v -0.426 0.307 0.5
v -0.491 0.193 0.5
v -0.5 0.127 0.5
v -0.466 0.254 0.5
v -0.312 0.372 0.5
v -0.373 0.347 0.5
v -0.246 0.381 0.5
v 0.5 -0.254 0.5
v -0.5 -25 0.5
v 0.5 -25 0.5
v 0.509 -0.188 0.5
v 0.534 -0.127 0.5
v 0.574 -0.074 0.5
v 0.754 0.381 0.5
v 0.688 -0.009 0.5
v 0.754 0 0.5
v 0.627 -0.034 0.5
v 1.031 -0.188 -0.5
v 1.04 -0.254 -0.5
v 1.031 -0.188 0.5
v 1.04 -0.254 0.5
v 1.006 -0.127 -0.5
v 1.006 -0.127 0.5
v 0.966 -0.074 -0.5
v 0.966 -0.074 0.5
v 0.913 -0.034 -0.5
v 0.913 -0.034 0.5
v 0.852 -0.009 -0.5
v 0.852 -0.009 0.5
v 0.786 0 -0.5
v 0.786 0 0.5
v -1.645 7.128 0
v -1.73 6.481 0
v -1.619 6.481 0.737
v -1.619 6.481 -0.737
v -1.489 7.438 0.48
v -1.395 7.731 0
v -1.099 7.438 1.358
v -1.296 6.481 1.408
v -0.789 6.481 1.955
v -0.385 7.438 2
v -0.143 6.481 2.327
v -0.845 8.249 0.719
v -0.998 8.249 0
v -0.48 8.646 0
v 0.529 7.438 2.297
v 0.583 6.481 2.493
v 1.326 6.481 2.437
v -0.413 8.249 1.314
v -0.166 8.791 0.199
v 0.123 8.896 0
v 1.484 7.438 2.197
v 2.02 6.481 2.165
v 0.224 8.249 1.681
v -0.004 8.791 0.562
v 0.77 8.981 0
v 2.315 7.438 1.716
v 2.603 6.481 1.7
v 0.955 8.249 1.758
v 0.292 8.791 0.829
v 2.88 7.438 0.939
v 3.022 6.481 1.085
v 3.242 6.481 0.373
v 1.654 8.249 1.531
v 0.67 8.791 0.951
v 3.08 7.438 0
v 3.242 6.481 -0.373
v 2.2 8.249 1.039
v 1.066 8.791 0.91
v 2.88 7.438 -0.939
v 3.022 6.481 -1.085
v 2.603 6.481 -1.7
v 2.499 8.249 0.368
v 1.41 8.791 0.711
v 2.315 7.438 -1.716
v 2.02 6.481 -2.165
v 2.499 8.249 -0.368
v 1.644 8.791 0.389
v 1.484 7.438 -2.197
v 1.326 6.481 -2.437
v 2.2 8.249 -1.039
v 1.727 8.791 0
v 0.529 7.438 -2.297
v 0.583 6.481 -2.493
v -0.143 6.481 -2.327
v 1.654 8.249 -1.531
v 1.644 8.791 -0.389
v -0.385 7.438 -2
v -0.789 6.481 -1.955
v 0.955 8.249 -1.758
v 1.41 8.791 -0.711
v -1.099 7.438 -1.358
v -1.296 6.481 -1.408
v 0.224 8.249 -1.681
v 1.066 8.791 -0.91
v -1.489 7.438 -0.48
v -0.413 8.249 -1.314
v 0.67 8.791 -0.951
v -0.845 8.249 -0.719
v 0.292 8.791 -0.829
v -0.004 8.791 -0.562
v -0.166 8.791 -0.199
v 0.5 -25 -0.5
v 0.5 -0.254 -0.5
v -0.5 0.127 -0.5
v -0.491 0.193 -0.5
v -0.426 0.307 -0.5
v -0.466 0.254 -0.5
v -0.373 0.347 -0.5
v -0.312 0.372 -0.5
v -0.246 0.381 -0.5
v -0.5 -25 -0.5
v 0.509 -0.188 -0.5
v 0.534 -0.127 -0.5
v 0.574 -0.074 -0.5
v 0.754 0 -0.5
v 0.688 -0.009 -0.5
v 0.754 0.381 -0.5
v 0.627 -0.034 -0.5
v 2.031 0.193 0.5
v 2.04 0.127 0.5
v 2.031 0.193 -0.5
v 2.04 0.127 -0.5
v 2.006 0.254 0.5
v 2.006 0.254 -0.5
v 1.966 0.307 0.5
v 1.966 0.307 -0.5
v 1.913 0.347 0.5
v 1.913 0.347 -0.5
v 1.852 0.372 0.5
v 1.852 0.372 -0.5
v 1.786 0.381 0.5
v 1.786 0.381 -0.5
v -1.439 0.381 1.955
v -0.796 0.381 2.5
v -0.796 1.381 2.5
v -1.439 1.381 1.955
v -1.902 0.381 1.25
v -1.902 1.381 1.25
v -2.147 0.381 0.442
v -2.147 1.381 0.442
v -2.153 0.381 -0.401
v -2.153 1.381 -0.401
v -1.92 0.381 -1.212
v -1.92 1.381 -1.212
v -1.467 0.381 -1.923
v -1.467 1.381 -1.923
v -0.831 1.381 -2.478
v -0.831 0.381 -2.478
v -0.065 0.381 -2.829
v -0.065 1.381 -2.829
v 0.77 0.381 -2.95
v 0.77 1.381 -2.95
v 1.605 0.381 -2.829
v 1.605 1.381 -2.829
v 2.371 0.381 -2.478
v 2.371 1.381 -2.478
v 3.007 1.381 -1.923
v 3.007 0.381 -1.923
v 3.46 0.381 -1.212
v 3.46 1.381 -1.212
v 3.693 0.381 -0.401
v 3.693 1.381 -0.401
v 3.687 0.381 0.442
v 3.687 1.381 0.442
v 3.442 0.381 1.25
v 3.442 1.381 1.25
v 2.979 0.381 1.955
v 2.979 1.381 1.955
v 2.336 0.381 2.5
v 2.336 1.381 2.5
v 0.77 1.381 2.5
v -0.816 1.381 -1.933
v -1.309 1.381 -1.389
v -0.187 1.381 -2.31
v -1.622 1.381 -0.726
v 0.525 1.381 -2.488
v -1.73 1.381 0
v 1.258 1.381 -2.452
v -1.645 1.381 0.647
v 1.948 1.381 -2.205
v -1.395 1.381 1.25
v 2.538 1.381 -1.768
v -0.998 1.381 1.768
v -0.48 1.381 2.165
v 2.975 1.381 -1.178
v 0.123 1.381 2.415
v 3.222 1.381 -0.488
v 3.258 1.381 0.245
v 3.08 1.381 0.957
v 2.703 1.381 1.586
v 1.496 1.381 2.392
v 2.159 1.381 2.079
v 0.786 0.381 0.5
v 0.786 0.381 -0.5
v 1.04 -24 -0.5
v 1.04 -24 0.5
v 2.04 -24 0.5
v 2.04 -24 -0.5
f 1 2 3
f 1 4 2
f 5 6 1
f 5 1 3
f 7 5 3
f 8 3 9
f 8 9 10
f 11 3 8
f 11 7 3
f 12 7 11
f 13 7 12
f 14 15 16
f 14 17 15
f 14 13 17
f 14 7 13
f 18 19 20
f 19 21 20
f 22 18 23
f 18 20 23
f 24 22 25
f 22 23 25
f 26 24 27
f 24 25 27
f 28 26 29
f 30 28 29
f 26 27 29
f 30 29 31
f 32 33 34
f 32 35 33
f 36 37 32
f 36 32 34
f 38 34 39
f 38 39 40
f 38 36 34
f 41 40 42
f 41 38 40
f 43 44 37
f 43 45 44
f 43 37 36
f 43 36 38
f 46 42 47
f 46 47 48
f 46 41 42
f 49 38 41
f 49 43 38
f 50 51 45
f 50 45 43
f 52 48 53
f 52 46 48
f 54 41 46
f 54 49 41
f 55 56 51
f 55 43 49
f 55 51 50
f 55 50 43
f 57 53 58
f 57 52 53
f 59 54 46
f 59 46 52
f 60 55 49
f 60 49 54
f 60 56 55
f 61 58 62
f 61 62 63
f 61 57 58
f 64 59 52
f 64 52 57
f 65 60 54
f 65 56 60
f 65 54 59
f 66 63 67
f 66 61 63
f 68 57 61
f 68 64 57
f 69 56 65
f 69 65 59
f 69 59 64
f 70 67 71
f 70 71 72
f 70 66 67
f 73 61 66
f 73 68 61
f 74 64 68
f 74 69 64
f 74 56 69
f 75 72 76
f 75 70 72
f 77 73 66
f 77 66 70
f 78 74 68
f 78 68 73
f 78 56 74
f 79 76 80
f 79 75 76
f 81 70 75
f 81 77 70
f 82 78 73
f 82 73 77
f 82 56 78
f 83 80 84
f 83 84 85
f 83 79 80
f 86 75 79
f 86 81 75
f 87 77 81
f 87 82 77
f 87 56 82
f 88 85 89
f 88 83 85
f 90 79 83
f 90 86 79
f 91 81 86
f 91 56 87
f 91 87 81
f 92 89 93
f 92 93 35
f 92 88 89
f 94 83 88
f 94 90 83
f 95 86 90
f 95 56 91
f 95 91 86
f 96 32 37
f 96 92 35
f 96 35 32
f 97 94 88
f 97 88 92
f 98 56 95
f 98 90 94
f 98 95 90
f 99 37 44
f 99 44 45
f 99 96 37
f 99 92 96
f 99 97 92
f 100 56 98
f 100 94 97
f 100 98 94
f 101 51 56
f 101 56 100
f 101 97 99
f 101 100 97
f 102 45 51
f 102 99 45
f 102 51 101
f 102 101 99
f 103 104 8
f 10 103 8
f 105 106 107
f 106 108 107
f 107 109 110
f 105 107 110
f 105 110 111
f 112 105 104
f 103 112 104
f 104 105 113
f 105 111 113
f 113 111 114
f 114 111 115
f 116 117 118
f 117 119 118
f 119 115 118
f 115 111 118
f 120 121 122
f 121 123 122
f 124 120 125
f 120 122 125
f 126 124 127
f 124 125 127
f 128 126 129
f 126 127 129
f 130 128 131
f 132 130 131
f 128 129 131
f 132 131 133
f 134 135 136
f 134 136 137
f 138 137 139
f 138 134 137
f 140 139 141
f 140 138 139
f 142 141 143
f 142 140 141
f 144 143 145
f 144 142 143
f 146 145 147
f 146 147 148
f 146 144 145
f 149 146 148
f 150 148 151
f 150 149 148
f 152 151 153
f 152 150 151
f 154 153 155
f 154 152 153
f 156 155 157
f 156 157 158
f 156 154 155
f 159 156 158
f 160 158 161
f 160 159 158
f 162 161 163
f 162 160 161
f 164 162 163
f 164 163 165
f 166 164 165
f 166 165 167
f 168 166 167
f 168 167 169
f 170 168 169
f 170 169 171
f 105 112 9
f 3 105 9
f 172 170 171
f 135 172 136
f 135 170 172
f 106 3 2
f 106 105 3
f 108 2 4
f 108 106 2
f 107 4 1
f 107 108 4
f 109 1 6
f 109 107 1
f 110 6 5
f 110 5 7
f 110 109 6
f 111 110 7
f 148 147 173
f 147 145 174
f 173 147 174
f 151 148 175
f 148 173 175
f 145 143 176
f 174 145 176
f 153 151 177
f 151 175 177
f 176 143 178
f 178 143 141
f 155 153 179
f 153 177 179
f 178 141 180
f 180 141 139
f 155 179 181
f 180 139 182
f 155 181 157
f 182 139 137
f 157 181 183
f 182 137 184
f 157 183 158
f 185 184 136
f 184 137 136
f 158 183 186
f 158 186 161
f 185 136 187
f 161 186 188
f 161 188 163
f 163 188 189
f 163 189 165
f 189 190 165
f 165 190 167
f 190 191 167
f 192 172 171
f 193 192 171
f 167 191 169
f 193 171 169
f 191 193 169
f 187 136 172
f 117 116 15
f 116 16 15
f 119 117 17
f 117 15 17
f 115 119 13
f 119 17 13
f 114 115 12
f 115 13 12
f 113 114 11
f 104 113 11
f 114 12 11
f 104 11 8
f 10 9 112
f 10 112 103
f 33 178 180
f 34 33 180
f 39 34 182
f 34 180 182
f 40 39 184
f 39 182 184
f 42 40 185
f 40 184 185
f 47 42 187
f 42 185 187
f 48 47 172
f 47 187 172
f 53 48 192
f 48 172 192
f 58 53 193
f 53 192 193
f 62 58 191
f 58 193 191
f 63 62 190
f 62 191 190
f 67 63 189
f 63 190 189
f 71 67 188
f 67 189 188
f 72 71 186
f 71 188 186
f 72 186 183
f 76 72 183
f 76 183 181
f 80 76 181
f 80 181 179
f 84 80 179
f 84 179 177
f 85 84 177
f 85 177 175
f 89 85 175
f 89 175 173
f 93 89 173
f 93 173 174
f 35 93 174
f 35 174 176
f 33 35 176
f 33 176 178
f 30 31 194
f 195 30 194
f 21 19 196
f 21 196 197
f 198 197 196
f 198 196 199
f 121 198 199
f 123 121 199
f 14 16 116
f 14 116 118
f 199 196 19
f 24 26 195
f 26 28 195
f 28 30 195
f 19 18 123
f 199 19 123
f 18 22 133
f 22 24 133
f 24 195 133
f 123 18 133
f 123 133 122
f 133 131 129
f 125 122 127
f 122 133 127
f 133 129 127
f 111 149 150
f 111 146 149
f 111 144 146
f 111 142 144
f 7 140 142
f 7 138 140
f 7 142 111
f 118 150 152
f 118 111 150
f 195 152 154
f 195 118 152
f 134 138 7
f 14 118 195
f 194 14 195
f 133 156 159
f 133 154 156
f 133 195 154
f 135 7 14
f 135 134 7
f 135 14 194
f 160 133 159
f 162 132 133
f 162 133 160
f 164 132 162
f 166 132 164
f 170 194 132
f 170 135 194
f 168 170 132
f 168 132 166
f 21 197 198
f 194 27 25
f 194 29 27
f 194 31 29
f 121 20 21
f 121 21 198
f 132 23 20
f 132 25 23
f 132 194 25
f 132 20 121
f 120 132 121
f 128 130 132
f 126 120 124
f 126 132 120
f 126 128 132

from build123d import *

# Parameters (mm, degrees)
SKETCH1_W           = 2.54
SKETCH1_H           = 1
BASE_EXTRUDE_DEPTH  = 0.381
SKETCH2_W           = 1
SKETCH2_H           = 1
BOSS_EXTRUDE1_DEPTH = 24
SKETCH7_W           = 1
SKETCH7_H           = 1
BOSS_EXTRUDE4_DEPTH = 1
FILLET5_R           = 0.254
BOSS_EXTRUDE2_DEPTH = 1
SKETCH4_R           = 2.5
BOSS_EXTRUDE3_DEPTH = 7.6
FILLET4_R           = 2.5
SKETCH6_W           = 0.032
SKETCH6_H           = 0.381
CUT_EXTRUDE1_DEPTH  = 4.45


with BuildPart() as part:
    # Sketch1 → Base-Extrude (new body)
    with BuildSketch(Plane(origin=(0, 0, 0), x_dir=(1, 0, 0), z_dir=(0, 1, 0))):
        with Locations((0.77, 0)):
            Rectangle(SKETCH1_W, SKETCH1_H)
    extrude(amount=BASE_EXTRUDE_DEPTH)

    # Sketch2 → Boss-Extrude1 (add)
    with BuildSketch(Plane.XZ):
        Rectangle(SKETCH2_W, SKETCH2_H)
        with Locations((1.54, 0)):
            Rectangle(SKETCH2_W, SKETCH2_H)
    extrude(amount=BOSS_EXTRUDE1_DEPTH)

    # Sketch7 → Boss-Extrude4 (add)
    with BuildSketch(Plane.XZ.offset(24)):
        Rectangle(SKETCH7_W, SKETCH7_H)
    extrude(amount=BOSS_EXTRUDE4_DEPTH)

    # Fillet5
    fillet5_edges = [part.edges().sort_by_distance(p)[0] for p in [
        (2.04, 0.381, 0),
        (0.5, 0, 0),
        (1.04, 0, 0),
        (-0.5, 0.381, 0),
    ]]
    fillet(fillet5_edges, radius=FILLET5_R)

    # Sketch3 → Boss-Extrude2 (add)
    with BuildSketch(Plane(origin=(0, 0.381, 0), x_dir=(-1, 0, 0), z_dir=(0, 1, 0))):
        with BuildLine():
            Line((-2.336045976, 2.5), (0.796045976, 2.5))
            ThreePointArc((0.796045976, 2.5), (-0.77, -2.95), (-2.336045976, 2.5))
        make_face()
    extrude(amount=BOSS_EXTRUDE2_DEPTH)

    # Sketch4 → Boss-Extrude3 (add)
    with BuildSketch(Plane(origin=(0, 1.381, 0), x_dir=(-1, 0, 0), z_dir=(0, 1, 0))):
        with Locations((-0.77, 0)):
            Circle(SKETCH4_R)
    extrude(amount=BOSS_EXTRUDE3_DEPTH)

    # Fillet4
    fillet4_edges = [part.edges().sort_by_distance(p)[0] for p in [
        (3.27, 8.981, 0),
    ]]
    fillet(fillet4_edges, radius=FILLET4_R)

    # Sketch6 → Cut-Extrude1 (cut, through all)
    with BuildSketch(Plane.XY.offset(0.5)):
        with Locations((0.77, 0.1905)):
            Rectangle(SKETCH6_W, SKETCH6_H)
    extrude(amount=-CUT_EXTRUDE1_DEPTH, mode=Mode.SUBTRACT)


solid = part.part
